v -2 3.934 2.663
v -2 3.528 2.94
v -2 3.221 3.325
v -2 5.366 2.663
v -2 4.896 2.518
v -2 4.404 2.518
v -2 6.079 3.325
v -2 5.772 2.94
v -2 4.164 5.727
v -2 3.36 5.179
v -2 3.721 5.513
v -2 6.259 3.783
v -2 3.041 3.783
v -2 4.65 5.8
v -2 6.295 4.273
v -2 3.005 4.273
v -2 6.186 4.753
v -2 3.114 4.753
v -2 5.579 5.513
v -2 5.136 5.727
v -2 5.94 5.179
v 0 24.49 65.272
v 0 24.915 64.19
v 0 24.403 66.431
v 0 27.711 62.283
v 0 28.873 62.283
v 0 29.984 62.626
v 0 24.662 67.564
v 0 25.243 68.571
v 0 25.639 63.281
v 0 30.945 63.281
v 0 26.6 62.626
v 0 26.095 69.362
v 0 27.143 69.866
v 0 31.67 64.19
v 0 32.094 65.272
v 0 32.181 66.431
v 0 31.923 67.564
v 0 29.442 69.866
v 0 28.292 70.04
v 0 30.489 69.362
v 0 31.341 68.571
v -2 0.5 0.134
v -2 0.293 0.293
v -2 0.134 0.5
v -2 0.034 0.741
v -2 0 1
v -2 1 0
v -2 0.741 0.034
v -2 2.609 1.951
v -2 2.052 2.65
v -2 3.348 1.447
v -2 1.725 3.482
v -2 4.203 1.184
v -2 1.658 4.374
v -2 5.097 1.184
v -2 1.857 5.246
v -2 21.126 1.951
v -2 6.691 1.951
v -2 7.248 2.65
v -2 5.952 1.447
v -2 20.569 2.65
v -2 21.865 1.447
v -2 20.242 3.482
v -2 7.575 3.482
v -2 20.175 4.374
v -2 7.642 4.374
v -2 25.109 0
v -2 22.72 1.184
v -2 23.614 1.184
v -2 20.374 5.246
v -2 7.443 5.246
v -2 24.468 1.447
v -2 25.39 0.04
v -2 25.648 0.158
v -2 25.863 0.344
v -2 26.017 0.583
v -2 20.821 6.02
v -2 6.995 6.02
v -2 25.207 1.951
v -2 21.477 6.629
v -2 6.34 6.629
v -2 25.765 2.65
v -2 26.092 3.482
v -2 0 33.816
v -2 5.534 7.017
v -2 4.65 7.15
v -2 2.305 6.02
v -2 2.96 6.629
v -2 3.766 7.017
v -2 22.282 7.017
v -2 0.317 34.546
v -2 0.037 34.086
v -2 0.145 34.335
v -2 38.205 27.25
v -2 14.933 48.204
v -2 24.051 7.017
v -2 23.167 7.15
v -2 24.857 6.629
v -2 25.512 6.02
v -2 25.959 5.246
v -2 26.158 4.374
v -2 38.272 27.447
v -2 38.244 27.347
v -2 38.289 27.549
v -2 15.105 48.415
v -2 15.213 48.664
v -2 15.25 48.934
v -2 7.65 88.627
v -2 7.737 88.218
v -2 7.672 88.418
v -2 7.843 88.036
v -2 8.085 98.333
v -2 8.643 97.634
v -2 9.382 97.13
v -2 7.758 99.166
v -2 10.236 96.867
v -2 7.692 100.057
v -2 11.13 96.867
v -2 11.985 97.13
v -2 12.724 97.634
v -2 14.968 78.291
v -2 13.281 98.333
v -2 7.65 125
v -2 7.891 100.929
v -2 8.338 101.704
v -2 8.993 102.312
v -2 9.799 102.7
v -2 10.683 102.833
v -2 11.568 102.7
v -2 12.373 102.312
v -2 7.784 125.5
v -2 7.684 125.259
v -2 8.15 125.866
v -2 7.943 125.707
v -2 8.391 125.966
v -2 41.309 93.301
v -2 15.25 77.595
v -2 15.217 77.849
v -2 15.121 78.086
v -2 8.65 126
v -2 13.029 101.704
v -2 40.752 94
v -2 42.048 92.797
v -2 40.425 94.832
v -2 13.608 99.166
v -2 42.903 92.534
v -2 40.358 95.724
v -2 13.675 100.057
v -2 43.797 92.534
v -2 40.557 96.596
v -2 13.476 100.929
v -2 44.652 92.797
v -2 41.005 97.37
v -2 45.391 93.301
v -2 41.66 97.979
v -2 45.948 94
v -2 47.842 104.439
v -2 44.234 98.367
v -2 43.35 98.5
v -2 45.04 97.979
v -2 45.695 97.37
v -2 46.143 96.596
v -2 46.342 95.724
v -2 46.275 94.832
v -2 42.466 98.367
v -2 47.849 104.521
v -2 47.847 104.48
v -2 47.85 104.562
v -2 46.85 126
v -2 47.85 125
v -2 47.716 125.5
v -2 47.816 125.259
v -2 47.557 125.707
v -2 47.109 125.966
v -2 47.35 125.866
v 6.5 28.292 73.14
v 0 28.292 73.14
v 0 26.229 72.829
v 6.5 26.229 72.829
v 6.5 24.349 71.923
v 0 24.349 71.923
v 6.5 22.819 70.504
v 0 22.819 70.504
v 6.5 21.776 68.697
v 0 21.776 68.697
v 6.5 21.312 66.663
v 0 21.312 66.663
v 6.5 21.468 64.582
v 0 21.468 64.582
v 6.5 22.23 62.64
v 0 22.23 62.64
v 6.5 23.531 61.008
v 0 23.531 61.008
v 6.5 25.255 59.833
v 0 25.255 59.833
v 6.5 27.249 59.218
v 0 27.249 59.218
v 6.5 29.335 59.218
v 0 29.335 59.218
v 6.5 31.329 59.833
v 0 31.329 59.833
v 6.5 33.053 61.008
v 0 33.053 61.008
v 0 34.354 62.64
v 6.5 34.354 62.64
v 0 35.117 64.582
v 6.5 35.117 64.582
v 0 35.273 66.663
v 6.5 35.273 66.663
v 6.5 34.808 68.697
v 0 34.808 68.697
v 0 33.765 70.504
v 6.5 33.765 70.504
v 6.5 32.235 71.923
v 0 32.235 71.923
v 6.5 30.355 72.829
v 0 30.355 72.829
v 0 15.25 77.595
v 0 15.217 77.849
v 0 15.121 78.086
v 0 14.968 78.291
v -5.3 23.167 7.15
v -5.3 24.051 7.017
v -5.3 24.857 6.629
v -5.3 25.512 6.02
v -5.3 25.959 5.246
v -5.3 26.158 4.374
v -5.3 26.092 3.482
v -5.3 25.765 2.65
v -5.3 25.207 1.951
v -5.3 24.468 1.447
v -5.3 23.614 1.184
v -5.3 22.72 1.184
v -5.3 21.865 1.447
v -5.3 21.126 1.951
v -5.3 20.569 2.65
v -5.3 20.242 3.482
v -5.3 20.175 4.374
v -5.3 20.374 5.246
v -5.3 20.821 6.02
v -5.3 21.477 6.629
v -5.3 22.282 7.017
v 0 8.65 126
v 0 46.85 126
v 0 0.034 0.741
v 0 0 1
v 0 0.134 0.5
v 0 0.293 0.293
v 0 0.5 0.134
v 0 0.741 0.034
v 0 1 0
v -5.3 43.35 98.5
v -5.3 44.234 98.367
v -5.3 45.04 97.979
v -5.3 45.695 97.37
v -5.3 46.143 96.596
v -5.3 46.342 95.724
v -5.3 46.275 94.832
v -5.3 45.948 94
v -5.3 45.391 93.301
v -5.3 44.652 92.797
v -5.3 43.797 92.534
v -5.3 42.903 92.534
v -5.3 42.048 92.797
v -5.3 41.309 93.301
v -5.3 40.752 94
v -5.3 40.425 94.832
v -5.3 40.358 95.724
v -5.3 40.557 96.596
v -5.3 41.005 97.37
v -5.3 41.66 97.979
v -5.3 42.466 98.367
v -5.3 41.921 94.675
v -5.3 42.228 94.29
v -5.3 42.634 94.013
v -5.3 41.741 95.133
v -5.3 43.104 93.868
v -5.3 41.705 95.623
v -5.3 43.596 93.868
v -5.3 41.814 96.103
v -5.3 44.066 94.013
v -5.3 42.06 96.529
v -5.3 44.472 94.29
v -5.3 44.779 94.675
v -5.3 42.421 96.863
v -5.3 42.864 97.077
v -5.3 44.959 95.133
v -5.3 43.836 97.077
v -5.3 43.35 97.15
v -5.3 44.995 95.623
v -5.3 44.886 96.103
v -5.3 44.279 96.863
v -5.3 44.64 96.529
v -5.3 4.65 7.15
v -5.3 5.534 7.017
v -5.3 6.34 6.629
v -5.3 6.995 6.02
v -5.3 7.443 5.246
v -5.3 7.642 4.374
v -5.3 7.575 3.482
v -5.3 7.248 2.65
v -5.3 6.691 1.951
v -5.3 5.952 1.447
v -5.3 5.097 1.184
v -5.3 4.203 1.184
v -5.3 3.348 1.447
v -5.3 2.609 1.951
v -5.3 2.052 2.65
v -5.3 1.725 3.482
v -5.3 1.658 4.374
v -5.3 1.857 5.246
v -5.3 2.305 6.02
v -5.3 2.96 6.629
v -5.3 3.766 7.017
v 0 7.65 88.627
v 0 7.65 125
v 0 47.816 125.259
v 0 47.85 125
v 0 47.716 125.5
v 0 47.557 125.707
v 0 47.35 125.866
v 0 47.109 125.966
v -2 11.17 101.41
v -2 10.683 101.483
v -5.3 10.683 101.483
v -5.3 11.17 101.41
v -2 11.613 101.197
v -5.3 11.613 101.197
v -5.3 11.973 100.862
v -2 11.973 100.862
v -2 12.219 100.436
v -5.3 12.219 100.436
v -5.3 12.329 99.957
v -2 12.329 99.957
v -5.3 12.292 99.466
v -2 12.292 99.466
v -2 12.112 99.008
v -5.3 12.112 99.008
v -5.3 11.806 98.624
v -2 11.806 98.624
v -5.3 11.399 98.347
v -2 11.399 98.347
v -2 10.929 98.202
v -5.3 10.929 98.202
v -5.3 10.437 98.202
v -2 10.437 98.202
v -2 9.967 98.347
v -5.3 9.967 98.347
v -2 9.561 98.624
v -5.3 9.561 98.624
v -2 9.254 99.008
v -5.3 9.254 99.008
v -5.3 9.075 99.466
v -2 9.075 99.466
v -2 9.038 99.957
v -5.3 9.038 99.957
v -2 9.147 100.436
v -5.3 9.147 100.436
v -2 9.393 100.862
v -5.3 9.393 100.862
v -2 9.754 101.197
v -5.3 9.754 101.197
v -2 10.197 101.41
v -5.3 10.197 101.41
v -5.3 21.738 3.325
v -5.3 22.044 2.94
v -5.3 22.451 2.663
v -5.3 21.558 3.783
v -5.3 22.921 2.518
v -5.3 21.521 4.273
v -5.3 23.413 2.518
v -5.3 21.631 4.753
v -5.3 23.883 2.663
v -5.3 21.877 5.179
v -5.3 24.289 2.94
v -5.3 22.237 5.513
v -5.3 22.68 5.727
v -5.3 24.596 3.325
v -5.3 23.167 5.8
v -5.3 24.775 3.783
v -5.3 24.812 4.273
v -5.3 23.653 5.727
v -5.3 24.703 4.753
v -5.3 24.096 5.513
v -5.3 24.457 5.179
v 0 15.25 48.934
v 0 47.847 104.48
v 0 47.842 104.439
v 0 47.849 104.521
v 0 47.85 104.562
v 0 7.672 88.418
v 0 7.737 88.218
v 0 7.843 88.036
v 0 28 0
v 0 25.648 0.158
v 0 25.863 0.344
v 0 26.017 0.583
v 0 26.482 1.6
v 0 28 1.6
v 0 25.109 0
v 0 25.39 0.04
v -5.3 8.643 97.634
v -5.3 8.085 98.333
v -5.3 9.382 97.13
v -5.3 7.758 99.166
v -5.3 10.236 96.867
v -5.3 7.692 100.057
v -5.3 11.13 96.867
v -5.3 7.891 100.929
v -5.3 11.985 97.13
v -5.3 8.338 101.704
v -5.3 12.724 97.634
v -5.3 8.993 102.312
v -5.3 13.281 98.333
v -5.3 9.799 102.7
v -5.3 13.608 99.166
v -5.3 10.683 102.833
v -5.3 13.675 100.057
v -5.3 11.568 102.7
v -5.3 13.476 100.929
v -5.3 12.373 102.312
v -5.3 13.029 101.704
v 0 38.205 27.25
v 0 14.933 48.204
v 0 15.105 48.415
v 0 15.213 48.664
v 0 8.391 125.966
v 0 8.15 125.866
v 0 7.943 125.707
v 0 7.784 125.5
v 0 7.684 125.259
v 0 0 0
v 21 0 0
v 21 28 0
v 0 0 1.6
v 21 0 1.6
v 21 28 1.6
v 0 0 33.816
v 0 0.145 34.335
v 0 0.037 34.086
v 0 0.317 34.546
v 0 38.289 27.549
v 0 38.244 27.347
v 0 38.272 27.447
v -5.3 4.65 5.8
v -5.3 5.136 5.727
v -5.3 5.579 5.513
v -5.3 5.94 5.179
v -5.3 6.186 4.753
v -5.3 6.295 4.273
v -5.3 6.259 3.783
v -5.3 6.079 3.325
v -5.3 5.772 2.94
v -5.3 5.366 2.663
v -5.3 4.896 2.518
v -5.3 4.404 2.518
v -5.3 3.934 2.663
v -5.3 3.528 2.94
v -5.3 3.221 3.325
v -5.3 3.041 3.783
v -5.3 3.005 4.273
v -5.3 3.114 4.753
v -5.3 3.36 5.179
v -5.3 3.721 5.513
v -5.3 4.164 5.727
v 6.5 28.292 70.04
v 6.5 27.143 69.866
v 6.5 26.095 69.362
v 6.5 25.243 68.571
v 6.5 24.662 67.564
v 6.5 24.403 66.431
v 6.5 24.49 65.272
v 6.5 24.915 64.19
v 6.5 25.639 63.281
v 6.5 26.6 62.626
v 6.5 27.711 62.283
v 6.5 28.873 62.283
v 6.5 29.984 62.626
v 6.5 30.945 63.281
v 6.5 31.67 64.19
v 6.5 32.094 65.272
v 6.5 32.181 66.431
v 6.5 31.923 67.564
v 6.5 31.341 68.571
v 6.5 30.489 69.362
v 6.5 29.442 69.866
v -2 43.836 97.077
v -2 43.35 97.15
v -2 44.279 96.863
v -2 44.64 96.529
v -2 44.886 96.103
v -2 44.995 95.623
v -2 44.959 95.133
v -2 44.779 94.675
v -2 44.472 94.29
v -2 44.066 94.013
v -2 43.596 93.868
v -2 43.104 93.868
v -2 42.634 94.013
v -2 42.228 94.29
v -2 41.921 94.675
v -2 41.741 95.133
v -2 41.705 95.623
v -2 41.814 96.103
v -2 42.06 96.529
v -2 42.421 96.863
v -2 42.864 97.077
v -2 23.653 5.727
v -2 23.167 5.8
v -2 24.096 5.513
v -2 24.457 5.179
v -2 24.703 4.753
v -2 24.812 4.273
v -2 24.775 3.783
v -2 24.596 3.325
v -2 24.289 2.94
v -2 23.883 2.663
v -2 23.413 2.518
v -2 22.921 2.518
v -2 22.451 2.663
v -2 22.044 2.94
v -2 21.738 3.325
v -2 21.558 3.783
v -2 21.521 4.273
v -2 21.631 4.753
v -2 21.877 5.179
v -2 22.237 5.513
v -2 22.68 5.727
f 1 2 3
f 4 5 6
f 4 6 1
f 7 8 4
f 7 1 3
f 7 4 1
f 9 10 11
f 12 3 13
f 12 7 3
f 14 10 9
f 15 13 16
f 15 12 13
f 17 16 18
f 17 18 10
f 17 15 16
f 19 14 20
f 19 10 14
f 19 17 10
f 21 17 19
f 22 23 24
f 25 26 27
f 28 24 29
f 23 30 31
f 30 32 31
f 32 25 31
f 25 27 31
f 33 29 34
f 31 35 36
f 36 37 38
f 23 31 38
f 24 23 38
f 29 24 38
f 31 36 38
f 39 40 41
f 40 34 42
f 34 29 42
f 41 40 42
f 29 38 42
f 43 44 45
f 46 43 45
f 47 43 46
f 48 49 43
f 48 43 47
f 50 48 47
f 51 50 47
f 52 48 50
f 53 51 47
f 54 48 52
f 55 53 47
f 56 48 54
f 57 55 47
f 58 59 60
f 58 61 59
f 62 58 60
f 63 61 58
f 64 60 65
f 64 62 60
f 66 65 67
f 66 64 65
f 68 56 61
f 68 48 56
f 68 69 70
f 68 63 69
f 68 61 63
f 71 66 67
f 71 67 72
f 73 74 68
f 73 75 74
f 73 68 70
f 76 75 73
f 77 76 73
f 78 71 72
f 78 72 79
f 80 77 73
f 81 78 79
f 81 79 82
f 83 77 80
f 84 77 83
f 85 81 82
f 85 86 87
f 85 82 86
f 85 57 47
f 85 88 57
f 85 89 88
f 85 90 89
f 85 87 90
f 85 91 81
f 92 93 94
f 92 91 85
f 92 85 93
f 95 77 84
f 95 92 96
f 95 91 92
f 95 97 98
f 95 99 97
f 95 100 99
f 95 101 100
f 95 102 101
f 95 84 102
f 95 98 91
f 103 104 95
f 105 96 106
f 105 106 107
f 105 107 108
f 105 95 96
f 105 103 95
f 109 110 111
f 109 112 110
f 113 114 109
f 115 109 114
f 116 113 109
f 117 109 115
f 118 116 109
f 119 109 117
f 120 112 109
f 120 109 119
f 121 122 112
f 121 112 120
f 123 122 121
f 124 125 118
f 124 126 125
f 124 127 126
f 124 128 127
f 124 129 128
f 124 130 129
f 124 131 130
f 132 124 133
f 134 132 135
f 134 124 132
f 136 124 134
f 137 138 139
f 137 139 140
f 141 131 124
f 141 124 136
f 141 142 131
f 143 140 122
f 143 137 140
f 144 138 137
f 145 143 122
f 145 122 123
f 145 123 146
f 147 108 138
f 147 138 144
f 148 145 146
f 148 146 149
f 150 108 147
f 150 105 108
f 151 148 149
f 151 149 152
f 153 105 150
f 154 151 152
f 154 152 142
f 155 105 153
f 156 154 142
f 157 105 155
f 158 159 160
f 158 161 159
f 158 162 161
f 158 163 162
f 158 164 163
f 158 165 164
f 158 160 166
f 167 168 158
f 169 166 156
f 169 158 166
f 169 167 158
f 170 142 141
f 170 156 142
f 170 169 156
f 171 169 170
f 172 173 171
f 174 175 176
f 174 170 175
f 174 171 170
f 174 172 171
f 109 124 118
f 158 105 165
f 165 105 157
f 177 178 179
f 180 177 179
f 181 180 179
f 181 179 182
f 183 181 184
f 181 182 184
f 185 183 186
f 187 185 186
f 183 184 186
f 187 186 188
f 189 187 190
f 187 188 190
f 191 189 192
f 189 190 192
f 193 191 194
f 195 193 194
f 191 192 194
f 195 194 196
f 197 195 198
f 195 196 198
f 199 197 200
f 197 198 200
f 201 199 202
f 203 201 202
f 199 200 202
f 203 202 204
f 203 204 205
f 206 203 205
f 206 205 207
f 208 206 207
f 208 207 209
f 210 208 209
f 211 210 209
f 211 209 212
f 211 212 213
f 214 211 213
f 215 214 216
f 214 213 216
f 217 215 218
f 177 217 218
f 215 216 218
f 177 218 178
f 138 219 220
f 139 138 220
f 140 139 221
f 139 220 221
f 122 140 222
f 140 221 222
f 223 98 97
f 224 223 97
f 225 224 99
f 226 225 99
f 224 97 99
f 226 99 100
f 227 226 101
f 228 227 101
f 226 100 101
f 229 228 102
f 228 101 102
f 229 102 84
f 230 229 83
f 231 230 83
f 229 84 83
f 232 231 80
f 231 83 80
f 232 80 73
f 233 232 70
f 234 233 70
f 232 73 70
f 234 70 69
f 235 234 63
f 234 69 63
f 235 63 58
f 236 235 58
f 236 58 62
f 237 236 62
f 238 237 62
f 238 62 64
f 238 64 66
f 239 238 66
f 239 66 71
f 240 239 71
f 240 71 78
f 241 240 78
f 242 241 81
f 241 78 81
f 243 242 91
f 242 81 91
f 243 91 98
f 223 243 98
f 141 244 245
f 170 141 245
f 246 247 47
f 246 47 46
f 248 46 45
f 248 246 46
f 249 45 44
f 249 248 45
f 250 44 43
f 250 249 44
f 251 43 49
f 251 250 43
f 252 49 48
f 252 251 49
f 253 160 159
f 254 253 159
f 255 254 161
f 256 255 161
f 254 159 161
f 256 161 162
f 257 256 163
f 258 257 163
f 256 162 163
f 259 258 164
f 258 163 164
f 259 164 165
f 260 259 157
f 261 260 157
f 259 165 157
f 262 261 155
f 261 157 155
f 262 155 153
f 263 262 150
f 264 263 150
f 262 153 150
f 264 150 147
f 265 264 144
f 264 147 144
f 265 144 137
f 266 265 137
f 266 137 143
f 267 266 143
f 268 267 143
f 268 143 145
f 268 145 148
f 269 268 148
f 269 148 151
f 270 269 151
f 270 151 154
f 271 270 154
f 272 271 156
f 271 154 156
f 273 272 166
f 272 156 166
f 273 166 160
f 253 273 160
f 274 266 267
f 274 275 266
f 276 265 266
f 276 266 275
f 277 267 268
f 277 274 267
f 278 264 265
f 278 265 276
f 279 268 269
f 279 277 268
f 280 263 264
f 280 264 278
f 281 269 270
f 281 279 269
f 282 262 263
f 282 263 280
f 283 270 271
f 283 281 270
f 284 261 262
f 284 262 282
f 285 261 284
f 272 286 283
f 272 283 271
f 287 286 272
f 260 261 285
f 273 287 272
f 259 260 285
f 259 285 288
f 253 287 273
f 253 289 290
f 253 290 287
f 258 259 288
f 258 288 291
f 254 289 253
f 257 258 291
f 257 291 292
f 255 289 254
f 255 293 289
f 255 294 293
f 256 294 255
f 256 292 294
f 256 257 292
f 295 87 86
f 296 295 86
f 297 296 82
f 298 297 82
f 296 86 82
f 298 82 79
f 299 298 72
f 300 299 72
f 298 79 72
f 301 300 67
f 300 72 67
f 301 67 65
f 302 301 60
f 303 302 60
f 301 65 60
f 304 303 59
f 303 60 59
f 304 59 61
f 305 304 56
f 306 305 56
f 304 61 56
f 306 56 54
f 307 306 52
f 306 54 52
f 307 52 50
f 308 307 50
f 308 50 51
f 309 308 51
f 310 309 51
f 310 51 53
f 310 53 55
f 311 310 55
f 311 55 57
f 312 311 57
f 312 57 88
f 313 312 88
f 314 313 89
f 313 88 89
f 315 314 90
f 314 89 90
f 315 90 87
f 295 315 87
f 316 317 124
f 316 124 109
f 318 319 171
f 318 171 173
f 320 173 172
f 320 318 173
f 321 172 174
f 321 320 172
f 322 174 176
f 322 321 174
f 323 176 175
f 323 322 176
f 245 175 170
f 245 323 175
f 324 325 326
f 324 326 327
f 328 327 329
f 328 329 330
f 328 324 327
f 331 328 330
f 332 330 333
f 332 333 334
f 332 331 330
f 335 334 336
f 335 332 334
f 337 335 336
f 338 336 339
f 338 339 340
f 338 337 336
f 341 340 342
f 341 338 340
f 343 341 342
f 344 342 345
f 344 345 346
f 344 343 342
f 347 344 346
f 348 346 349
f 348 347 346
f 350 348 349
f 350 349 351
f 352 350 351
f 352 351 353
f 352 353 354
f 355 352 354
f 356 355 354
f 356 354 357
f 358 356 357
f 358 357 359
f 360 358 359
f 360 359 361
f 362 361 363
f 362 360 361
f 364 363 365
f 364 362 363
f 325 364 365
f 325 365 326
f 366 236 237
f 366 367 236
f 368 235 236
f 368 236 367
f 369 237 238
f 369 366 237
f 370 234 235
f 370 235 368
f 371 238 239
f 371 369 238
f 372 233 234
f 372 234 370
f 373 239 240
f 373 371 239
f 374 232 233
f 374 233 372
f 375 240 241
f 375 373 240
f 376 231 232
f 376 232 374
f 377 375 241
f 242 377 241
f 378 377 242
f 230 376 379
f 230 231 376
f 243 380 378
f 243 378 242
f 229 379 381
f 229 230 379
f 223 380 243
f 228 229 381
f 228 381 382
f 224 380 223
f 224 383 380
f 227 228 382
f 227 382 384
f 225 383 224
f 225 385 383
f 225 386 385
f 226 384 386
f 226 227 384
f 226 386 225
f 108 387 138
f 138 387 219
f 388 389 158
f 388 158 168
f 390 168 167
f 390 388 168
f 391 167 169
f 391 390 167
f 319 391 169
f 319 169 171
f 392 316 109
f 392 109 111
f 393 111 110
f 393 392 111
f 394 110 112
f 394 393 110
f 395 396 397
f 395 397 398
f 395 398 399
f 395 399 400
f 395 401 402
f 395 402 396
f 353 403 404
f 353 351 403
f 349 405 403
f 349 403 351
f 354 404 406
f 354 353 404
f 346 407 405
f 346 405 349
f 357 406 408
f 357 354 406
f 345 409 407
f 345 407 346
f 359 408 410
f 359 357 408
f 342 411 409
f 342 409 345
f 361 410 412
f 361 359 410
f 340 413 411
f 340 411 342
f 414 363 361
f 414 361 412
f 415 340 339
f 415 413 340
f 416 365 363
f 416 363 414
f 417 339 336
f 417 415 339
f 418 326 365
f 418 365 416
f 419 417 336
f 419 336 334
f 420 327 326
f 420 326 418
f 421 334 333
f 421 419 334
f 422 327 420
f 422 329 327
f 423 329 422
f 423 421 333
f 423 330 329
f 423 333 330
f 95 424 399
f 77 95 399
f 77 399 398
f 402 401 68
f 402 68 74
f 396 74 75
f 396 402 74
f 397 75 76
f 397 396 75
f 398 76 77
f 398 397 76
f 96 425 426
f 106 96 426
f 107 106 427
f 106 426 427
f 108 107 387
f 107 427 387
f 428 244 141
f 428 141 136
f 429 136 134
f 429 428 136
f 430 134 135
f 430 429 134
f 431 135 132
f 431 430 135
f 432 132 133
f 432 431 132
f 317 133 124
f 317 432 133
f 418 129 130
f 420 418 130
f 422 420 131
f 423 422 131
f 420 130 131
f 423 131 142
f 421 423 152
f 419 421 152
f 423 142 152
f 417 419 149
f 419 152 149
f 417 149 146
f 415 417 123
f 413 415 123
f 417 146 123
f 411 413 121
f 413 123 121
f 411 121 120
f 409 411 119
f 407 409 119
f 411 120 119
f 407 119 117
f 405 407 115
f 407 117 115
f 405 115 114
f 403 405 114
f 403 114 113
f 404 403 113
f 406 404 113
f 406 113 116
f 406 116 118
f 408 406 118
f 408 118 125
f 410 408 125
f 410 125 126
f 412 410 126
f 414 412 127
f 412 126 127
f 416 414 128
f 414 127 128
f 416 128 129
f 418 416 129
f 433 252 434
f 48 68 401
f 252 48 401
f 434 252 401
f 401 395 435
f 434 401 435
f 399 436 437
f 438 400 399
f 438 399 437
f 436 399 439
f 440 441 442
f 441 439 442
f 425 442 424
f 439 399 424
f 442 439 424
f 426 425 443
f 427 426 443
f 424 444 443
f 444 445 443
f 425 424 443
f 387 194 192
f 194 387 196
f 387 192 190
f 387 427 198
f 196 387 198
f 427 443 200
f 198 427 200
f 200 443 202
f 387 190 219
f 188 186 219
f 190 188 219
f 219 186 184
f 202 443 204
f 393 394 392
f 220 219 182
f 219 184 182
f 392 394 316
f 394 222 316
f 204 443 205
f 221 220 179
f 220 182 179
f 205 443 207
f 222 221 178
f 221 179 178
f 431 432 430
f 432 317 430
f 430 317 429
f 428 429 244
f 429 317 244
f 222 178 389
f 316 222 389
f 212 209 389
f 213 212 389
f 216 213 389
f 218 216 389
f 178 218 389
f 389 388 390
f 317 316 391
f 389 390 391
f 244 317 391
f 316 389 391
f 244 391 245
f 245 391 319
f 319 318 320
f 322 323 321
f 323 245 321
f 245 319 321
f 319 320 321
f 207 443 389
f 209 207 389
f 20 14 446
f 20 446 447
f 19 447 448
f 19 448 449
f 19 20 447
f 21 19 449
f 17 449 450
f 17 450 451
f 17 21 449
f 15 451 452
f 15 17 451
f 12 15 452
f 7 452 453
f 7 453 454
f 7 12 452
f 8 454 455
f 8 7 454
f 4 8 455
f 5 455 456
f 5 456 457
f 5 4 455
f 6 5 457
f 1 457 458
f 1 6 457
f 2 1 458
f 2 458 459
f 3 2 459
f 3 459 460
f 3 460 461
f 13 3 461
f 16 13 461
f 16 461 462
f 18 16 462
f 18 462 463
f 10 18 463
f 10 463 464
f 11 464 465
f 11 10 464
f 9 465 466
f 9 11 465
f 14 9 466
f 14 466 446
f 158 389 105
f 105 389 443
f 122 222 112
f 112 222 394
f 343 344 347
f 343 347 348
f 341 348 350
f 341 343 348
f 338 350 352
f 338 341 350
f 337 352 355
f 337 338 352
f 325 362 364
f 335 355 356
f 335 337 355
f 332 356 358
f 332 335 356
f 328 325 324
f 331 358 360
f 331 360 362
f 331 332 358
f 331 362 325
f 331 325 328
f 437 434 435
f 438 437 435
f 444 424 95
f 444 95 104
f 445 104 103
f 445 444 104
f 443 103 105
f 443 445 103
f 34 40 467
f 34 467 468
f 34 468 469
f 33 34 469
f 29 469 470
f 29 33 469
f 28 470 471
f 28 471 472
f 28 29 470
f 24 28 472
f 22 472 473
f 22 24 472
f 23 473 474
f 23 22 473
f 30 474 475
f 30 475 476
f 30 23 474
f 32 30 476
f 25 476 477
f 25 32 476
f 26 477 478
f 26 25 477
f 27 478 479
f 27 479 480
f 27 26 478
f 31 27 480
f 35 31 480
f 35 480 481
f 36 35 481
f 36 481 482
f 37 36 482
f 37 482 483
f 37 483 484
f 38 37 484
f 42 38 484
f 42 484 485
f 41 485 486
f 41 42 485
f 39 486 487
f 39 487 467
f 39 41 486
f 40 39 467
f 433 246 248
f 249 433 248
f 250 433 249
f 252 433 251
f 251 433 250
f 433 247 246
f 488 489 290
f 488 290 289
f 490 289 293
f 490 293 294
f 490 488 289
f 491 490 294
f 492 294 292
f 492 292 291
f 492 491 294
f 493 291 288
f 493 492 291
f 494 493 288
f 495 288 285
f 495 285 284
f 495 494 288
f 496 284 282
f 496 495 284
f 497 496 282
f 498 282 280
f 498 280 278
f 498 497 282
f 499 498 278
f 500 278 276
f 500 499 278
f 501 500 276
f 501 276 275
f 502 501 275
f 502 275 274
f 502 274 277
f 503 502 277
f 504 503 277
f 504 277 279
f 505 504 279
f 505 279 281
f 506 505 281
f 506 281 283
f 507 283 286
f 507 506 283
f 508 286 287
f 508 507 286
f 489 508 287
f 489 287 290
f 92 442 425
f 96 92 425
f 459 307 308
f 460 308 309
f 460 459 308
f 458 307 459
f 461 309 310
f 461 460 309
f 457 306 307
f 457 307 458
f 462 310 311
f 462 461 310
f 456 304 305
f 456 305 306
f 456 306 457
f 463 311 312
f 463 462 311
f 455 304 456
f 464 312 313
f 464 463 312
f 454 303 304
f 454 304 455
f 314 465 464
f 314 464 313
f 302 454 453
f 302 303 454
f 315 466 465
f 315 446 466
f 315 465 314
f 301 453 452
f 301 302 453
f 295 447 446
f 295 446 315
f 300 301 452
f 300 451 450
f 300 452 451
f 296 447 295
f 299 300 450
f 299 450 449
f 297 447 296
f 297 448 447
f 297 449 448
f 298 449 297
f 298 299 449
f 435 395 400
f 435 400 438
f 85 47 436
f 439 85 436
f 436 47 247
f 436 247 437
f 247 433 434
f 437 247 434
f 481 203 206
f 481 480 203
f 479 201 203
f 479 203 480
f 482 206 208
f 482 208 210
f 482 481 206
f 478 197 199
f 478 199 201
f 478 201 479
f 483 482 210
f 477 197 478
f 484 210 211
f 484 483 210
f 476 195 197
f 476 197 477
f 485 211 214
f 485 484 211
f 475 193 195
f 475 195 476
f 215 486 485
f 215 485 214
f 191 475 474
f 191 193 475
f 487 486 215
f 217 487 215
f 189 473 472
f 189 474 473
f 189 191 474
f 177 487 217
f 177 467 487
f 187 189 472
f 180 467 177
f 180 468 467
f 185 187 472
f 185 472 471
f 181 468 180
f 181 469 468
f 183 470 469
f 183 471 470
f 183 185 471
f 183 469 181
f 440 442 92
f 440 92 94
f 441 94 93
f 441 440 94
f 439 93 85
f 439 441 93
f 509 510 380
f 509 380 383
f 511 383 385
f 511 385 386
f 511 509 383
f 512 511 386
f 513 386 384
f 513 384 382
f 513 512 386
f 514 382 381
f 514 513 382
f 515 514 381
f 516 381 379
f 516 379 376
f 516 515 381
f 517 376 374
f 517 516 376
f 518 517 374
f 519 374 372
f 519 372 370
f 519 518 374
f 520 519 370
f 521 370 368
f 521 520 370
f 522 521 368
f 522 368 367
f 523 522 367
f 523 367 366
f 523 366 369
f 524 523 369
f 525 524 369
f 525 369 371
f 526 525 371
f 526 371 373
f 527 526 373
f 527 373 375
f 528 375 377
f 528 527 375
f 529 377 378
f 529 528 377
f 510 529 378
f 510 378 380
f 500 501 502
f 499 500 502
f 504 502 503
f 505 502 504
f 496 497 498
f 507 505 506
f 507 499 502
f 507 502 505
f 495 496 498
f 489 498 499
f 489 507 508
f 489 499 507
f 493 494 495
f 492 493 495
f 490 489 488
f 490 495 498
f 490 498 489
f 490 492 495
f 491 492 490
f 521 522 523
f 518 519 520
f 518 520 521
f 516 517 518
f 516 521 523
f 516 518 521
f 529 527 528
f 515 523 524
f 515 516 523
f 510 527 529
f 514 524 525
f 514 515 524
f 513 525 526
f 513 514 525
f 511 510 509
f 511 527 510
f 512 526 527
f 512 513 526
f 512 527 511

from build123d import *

# Parameters (mm, degrees)
PAD_DEPTH             = 2
PCB_SKETCH_F9E005_R   = 3
PCB_SKETCH_F9E005_R_2 = 1.65
PAD003_DEPTH          = 3.3
SKETCH_W              = 21
SKETCH_H              = 28
PAD015_DEPTH          = 1.6
SKETCH017_R           = 7
SKETCH017_R_2         = 3.9
PAD016_DEPTH          = 6.5


with BuildPart() as part:
    # PCB_Sketch_f9e4 → Pad (new body)
    with BuildSketch(Plane.ZY):
        with BuildLine():
            Line((48.934205, 15.25), (77.594554, 15.25))
            ThreePointArc((77.594554, 15.25), (77.970292, 15.176729), (78.290965, 14.967643))
            Line((78.290965, 14.967643), (88.036374, 7.842738))
            ThreePointArc((88.626567, 7.65), (88.316134, 7.699405), (88.036374, 7.842738))
            Line((125, 7.65), (88.626567, 7.65))
            ThreePointArc((126, 8.65), (125.707107, 7.942893), (125, 7.65))
            Line((126, 8.65), (126, 45.95))
            Line((126, 45.95), (126, 46.85))
            ThreePointArc((125, 47.85), (125.707107, 47.557107), (126, 46.85))
            Line((104.561886, 47.85), (125, 47.85))
            ThreePointArc((104.438586, 47.842369), (104.500118, 47.84809), (104.561886, 47.85))
            Line((104.438586, 47.842369), (27.548891, 38.288977))
            ThreePointArc((27.250327, 38.20537), (27.396349, 38.258815), (27.548891, 38.288977))
            Line((27.250327, 38.20537), (0.583058, 26.017458))
            ThreePointArc((0, 25.108525), (0.158304, 25.648452), (0.583058, 26.017458))
            Line((0, 25.108525), (0, 1))
            ThreePointArc((1, 0), (0.292893, 0.292893), (0, 1))
            Line((1, 0), (33.815795, 0))
            ThreePointArc((34.546452, 0.317255), (34.214075, 0.082738), (33.815795, 0))
            Line((34.546452, 0.317255), (48.203548, 14.932745))
            ThreePointArc((48.203548, 14.932745), (48.535925, 15.167262), (48.934205, 15.25))
        make_face()
    extrude(amount=PAD_DEPTH)

    # PCB_Sketch_f9e005 (on Face21 of Pad) → Pad003 (join)
    with BuildSketch(Plane.ZY.offset(2)):
        with Locations((4.15, 23.166726)):
            Circle(PCB_SKETCH_F9E005_R)
        with Locations((4.15, 23.166726)):
            Circle(PCB_SKETCH_F9E005_R_2, mode=Mode.SUBTRACT)
        with Locations((4.15, 4.65)):
            Circle(PCB_SKETCH_F9E005_R)
        with Locations((4.15, 4.65)):
            Circle(PCB_SKETCH_F9E005_R_2, mode=Mode.SUBTRACT)
        with Locations((95.5, 43.35)):
            Circle(PCB_SKETCH_F9E005_R)
        with Locations((95.5, 43.35)):
            Circle(PCB_SKETCH_F9E005_R_2, mode=Mode.SUBTRACT)
        with Locations((99.833274, 10.683274)):
            Circle(PCB_SKETCH_F9E005_R)
        with Locations((99.833274, 10.683274)):
            Circle(PCB_SKETCH_F9E005_R_2, mode=Mode.SUBTRACT)
    extrude(amount=PAD003_DEPTH)

    # Sketch → Pad015 (join)
    with BuildSketch(Plane.XY):
        with Locations((10.5, 14)):
            Rectangle(SKETCH_W, SKETCH_H)
    extrude(amount=PAD015_DEPTH)

    # Sketch017 (on Face4 of Pad015) → Pad016 (join)
    with BuildSketch(Plane(origin=(0, 0, 0), x_dir=(0, 0, 1), z_dir=(1, 0, 0))):
        with Locations((66.139557, -28.292141)):
            Circle(SKETCH017_R)
        with Locations((66.139557, -28.292141)):
            Circle(SKETCH017_R_2, mode=Mode.SUBTRACT)
    extrude(amount=PAD016_DEPTH)


solid = part.part
